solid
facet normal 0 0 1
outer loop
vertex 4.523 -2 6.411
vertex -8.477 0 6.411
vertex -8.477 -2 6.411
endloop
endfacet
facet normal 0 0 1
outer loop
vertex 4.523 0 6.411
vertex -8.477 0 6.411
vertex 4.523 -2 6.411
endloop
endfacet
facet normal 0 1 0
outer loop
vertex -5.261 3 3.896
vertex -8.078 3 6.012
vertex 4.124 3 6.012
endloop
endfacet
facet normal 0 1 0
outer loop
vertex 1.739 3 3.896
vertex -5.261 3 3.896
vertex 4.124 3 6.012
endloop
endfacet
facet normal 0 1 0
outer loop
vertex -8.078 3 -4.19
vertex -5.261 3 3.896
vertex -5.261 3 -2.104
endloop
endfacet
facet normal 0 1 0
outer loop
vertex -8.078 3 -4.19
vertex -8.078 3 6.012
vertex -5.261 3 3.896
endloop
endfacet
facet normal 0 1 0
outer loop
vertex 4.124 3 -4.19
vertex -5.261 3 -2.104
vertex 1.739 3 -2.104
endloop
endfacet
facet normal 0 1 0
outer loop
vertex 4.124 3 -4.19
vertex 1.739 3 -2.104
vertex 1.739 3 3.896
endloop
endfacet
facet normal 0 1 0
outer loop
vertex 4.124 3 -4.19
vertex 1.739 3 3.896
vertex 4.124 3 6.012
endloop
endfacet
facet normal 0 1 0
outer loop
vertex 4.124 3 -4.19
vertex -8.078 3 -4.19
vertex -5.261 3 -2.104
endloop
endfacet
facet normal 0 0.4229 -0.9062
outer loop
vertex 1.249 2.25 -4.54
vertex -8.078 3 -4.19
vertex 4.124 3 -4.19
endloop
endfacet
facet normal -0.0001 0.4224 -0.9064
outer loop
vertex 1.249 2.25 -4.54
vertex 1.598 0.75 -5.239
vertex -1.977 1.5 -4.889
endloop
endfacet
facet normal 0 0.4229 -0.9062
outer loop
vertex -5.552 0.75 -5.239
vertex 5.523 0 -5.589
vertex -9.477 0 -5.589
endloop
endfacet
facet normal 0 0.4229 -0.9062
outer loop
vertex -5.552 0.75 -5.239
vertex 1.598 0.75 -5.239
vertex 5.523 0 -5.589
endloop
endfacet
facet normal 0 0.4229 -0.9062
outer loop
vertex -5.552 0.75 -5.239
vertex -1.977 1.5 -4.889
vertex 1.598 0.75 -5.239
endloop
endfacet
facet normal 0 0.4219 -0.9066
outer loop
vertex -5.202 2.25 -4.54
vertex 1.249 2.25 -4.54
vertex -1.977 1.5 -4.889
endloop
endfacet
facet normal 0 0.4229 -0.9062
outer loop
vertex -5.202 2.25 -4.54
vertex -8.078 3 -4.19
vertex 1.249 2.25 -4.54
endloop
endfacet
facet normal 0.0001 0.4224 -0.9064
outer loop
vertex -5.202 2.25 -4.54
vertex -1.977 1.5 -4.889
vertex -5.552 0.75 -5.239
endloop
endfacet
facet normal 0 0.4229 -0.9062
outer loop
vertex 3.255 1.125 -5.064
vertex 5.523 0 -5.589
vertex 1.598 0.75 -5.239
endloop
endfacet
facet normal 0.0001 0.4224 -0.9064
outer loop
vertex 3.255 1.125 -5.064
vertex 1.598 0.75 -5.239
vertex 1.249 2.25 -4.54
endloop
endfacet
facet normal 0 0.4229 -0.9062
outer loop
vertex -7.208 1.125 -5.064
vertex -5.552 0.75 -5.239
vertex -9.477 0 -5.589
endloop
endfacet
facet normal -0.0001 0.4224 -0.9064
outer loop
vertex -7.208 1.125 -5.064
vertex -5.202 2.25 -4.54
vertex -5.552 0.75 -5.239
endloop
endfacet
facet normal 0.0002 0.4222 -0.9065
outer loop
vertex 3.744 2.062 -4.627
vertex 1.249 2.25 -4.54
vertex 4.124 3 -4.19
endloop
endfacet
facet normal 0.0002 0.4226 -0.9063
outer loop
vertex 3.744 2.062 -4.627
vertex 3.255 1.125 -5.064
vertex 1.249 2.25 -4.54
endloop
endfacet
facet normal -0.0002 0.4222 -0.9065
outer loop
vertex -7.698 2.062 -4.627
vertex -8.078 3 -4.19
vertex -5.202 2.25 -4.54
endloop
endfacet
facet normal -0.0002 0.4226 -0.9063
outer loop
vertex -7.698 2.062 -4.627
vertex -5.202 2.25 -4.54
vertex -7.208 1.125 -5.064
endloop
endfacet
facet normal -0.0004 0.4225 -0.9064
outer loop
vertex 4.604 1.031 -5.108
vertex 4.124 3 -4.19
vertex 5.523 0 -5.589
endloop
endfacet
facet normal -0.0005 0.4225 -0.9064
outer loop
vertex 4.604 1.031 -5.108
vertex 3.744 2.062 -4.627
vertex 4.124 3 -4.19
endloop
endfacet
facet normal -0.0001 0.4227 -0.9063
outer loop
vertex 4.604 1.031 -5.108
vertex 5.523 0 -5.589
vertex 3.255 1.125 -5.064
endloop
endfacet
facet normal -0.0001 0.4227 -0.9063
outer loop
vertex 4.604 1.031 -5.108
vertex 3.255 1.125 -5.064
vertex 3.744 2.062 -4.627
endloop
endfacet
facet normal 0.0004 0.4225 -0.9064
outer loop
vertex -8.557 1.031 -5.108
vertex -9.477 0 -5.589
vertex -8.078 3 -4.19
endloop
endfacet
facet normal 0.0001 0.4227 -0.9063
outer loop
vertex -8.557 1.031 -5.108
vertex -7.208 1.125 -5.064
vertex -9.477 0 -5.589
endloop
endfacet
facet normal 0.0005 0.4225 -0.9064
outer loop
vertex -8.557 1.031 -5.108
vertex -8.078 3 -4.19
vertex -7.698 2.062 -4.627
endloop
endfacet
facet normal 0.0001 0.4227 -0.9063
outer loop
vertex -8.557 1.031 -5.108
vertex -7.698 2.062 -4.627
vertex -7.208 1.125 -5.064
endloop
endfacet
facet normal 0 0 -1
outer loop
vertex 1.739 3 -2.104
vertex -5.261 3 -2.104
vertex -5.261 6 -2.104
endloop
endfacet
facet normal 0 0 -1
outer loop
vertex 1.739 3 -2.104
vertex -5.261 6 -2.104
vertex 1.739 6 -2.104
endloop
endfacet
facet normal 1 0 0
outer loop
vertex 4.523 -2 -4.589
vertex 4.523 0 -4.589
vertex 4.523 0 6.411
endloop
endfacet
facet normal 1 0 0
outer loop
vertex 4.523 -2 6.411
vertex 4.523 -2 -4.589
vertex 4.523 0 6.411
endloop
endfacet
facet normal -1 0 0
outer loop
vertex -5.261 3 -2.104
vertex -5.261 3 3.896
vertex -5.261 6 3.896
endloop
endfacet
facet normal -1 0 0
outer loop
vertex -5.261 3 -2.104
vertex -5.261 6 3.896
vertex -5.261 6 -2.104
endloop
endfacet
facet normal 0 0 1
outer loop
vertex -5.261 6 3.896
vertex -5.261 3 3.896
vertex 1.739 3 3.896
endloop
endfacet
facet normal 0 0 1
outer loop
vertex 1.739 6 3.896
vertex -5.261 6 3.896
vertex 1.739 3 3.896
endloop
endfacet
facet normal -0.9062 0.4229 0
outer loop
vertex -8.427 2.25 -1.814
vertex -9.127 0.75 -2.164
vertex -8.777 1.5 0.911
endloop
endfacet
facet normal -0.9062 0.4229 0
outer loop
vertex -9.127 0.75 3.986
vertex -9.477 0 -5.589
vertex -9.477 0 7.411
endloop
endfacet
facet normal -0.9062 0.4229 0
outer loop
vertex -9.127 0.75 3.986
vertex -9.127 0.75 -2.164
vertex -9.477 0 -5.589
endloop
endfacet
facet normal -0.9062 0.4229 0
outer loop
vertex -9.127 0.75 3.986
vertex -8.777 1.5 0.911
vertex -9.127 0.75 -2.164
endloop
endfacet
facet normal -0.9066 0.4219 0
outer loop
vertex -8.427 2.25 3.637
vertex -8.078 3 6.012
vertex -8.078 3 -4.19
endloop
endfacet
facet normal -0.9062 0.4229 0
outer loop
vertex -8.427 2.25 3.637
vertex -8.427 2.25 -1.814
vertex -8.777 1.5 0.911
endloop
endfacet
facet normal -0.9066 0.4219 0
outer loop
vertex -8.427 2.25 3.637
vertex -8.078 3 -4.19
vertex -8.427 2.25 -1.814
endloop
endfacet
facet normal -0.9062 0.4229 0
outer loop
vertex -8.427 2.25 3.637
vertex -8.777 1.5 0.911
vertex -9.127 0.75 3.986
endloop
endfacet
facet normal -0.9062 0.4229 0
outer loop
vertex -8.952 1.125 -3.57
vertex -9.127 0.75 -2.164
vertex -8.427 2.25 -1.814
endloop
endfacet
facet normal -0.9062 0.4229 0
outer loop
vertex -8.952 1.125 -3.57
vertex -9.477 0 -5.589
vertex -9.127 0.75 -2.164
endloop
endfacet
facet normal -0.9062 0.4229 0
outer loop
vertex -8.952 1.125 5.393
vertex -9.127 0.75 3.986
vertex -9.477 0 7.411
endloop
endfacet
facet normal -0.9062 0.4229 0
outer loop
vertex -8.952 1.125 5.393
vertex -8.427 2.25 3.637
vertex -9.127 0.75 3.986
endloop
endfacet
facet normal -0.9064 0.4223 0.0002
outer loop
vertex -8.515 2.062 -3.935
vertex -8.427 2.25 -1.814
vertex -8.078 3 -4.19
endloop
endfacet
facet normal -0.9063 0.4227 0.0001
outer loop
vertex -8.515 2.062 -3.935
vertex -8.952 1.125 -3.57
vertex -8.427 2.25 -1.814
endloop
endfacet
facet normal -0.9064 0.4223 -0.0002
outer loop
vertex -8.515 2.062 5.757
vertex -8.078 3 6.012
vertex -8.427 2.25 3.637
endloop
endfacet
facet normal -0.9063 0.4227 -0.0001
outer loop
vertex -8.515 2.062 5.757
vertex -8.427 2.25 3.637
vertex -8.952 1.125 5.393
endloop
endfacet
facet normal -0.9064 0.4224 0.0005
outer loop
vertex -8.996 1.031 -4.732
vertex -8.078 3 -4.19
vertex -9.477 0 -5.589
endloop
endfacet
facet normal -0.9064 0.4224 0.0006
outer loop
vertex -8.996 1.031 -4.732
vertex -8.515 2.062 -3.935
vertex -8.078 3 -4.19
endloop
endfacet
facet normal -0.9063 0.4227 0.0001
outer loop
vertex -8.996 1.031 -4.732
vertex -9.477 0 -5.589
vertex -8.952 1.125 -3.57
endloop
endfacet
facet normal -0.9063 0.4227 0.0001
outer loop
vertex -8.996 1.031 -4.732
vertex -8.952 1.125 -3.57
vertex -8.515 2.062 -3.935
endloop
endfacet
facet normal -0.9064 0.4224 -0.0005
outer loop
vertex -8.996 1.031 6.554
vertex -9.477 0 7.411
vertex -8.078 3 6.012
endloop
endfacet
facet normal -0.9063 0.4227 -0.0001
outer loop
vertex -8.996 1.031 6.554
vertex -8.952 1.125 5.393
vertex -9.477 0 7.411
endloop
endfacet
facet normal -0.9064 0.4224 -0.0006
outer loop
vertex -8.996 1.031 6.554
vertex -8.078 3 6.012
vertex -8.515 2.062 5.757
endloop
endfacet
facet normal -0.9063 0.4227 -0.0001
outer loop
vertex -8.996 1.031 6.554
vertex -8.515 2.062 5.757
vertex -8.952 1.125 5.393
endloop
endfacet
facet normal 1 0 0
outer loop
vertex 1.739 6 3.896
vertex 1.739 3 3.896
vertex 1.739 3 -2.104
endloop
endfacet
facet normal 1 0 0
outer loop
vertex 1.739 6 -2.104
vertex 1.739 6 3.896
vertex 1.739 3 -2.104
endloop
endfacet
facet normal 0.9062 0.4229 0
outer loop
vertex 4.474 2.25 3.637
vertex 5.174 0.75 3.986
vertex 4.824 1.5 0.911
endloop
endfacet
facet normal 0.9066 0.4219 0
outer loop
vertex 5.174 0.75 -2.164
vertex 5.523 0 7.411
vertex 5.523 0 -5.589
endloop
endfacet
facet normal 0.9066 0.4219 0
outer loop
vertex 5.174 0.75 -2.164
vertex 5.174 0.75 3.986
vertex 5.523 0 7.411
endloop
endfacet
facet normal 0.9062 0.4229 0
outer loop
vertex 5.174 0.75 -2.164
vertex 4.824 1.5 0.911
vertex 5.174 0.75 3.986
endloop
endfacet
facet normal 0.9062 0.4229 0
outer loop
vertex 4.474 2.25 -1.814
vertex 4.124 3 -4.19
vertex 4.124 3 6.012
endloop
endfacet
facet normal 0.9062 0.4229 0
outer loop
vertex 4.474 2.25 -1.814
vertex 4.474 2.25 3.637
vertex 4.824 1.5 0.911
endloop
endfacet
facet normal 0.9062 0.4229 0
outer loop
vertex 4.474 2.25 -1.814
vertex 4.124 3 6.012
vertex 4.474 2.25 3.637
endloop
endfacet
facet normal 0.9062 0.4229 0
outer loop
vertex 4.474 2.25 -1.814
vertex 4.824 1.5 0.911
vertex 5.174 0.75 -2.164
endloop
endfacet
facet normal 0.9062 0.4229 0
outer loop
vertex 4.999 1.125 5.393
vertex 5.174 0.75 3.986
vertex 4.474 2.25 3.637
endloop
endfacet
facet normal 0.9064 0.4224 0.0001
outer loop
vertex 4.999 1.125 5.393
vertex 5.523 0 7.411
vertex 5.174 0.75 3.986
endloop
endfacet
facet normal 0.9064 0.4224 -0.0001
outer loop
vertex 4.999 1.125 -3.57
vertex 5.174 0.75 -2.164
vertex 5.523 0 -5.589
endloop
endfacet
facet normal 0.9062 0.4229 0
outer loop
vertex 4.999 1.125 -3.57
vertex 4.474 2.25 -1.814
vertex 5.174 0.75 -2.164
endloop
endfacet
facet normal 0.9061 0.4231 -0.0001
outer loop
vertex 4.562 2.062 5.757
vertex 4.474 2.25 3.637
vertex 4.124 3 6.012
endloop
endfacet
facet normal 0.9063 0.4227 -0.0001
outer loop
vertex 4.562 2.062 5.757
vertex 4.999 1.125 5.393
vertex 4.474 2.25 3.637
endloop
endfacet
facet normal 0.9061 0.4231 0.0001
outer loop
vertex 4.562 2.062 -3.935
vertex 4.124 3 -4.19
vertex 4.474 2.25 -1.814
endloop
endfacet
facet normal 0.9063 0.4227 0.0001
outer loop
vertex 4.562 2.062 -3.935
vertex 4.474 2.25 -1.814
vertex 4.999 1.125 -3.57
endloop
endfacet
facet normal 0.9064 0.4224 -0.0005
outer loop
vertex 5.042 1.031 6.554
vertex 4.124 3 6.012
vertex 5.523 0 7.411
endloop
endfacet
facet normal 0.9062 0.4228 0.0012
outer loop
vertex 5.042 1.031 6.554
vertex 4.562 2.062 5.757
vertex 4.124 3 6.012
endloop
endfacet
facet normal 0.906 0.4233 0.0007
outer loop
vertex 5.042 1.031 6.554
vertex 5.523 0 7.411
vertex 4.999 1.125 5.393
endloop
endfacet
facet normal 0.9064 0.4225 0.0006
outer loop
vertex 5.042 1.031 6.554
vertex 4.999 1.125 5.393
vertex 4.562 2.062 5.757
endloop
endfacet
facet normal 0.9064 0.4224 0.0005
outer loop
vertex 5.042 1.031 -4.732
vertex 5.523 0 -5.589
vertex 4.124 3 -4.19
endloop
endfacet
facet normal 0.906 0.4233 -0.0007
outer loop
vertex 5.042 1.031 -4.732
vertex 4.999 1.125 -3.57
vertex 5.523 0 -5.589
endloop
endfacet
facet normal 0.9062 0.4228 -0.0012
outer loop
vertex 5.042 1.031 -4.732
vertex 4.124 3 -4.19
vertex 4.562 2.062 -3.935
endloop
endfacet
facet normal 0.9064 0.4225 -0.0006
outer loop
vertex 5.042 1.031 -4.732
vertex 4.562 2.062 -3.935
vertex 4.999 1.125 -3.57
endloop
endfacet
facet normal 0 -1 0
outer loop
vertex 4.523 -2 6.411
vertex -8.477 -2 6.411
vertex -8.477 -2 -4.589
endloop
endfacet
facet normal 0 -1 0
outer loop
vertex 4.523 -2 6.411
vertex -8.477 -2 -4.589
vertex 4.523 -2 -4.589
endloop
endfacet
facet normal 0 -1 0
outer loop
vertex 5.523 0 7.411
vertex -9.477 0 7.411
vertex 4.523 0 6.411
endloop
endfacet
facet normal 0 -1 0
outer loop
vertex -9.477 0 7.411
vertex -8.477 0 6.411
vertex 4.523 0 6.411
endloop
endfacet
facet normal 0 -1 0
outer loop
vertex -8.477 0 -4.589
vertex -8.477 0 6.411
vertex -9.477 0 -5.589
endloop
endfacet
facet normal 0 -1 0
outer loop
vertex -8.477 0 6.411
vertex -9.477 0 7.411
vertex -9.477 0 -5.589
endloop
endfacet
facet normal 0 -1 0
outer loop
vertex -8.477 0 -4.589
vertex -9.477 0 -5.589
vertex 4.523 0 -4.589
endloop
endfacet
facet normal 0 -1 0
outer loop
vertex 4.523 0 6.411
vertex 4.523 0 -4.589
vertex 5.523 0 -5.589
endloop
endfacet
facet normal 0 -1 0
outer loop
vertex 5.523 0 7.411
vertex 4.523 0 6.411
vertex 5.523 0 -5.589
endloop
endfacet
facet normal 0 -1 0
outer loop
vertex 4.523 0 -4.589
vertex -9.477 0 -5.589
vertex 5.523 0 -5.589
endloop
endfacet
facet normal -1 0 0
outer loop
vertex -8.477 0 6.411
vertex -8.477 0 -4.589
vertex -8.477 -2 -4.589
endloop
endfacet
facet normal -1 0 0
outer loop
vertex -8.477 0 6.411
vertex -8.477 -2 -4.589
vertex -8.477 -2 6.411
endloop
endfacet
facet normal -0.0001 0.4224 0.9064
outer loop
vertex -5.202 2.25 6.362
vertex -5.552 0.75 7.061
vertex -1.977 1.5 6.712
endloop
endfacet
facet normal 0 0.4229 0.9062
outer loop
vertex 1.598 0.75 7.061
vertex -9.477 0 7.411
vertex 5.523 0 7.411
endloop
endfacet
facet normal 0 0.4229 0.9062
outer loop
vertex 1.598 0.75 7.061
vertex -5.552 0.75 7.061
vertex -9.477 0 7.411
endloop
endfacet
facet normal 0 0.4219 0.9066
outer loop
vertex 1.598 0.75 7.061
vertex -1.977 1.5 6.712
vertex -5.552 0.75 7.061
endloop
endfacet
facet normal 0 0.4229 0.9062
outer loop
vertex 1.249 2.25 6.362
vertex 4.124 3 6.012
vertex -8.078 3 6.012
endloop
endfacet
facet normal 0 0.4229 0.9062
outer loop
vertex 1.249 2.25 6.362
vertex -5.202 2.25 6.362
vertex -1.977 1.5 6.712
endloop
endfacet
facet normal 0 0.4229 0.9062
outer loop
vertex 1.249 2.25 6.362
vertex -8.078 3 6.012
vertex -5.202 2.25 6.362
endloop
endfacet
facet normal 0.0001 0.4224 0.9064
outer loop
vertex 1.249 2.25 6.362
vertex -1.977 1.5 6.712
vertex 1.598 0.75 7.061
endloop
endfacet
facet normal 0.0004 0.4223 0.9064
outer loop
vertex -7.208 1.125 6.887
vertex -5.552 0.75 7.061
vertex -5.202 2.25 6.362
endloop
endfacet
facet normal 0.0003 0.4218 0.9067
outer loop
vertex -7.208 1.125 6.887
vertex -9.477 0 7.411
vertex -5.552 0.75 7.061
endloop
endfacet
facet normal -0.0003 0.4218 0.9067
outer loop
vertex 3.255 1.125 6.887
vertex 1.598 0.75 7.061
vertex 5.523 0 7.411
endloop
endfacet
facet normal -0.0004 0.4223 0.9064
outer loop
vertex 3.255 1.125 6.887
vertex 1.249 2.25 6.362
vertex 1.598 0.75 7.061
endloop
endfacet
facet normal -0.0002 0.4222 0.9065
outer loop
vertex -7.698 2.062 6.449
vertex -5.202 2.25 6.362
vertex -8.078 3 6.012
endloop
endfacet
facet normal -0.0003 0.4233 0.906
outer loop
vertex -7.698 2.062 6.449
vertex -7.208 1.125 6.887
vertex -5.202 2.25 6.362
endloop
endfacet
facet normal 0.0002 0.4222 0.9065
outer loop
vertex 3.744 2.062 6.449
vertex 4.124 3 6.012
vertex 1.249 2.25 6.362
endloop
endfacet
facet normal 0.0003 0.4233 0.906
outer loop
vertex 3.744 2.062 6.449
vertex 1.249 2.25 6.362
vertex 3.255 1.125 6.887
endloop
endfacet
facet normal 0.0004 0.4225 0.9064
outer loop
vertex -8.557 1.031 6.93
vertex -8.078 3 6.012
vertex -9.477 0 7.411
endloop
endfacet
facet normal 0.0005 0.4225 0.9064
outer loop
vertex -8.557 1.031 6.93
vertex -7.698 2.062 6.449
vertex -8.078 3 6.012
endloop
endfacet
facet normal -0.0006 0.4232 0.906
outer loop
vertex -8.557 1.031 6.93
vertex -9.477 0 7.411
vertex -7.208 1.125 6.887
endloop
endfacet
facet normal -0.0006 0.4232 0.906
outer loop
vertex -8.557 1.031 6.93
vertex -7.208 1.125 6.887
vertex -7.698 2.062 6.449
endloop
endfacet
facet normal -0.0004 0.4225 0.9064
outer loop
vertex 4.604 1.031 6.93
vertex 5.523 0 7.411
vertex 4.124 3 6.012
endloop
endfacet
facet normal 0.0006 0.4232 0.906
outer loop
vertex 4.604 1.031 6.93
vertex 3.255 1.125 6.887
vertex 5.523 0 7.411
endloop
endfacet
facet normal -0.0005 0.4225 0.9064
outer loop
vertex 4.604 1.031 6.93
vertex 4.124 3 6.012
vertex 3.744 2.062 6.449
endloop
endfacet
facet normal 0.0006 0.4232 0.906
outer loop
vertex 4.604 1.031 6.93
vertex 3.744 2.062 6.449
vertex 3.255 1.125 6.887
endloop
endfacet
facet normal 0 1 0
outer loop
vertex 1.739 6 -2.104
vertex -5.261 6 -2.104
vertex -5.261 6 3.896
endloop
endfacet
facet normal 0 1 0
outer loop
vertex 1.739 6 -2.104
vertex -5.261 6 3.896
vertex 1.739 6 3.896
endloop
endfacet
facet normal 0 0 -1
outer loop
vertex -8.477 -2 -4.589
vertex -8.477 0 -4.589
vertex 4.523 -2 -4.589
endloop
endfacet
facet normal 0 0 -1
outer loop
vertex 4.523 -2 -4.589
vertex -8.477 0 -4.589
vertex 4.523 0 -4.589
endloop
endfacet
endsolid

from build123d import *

# Parameters (mm, degrees)
SKETCH1_W           = 15
SKETCH1_H           = 13
BOSS_EXTRUDE1_DEPTH = 3
BOSS_EXTRUDE1_TAPER = 25
SKETCH2_W           = 7
SKETCH2_H           = 6
BOSS_EXTRUDE2_DEPTH = 3
SKETCH4_W           = 13
SKETCH4_H           = 11
BOSS_EXTRUDE3_DEPTH = 2


with BuildPart() as part:
    # Sketch1 → Boss-Extrude1 (new body)
    with BuildSketch(Plane(origin=(0, 0, 0), x_dir=(1, 0, 0), z_dir=(0, 1, 0))):
        with Locations((-1.976635514, -0.911214953)):
            Rectangle(SKETCH1_W, SKETCH1_H)
    extrude(amount=BOSS_EXTRUDE1_DEPTH, taper=BOSS_EXTRUDE1_TAPER)

    # Sketch2 → Boss-Extrude2 (add)
    with BuildSketch(Plane(origin=(0, 3, 0), x_dir=(1, 0, 0), z_dir=(0, 1, 0))):
        with Locations((-1.761302023, -0.89583399)):
            Rectangle(SKETCH2_W, SKETCH2_H)
    extrude(amount=BOSS_EXTRUDE2_DEPTH)

    # Sketch4 → Boss-Extrude3 (add)
    with BuildSketch(Plane.XZ):
        with Locations((-1.976635514, 0.911214953)):
            Rectangle(SKETCH4_W, SKETCH4_H)
    extrude(amount=BOSS_EXTRUDE3_DEPTH)


solid = part.part
